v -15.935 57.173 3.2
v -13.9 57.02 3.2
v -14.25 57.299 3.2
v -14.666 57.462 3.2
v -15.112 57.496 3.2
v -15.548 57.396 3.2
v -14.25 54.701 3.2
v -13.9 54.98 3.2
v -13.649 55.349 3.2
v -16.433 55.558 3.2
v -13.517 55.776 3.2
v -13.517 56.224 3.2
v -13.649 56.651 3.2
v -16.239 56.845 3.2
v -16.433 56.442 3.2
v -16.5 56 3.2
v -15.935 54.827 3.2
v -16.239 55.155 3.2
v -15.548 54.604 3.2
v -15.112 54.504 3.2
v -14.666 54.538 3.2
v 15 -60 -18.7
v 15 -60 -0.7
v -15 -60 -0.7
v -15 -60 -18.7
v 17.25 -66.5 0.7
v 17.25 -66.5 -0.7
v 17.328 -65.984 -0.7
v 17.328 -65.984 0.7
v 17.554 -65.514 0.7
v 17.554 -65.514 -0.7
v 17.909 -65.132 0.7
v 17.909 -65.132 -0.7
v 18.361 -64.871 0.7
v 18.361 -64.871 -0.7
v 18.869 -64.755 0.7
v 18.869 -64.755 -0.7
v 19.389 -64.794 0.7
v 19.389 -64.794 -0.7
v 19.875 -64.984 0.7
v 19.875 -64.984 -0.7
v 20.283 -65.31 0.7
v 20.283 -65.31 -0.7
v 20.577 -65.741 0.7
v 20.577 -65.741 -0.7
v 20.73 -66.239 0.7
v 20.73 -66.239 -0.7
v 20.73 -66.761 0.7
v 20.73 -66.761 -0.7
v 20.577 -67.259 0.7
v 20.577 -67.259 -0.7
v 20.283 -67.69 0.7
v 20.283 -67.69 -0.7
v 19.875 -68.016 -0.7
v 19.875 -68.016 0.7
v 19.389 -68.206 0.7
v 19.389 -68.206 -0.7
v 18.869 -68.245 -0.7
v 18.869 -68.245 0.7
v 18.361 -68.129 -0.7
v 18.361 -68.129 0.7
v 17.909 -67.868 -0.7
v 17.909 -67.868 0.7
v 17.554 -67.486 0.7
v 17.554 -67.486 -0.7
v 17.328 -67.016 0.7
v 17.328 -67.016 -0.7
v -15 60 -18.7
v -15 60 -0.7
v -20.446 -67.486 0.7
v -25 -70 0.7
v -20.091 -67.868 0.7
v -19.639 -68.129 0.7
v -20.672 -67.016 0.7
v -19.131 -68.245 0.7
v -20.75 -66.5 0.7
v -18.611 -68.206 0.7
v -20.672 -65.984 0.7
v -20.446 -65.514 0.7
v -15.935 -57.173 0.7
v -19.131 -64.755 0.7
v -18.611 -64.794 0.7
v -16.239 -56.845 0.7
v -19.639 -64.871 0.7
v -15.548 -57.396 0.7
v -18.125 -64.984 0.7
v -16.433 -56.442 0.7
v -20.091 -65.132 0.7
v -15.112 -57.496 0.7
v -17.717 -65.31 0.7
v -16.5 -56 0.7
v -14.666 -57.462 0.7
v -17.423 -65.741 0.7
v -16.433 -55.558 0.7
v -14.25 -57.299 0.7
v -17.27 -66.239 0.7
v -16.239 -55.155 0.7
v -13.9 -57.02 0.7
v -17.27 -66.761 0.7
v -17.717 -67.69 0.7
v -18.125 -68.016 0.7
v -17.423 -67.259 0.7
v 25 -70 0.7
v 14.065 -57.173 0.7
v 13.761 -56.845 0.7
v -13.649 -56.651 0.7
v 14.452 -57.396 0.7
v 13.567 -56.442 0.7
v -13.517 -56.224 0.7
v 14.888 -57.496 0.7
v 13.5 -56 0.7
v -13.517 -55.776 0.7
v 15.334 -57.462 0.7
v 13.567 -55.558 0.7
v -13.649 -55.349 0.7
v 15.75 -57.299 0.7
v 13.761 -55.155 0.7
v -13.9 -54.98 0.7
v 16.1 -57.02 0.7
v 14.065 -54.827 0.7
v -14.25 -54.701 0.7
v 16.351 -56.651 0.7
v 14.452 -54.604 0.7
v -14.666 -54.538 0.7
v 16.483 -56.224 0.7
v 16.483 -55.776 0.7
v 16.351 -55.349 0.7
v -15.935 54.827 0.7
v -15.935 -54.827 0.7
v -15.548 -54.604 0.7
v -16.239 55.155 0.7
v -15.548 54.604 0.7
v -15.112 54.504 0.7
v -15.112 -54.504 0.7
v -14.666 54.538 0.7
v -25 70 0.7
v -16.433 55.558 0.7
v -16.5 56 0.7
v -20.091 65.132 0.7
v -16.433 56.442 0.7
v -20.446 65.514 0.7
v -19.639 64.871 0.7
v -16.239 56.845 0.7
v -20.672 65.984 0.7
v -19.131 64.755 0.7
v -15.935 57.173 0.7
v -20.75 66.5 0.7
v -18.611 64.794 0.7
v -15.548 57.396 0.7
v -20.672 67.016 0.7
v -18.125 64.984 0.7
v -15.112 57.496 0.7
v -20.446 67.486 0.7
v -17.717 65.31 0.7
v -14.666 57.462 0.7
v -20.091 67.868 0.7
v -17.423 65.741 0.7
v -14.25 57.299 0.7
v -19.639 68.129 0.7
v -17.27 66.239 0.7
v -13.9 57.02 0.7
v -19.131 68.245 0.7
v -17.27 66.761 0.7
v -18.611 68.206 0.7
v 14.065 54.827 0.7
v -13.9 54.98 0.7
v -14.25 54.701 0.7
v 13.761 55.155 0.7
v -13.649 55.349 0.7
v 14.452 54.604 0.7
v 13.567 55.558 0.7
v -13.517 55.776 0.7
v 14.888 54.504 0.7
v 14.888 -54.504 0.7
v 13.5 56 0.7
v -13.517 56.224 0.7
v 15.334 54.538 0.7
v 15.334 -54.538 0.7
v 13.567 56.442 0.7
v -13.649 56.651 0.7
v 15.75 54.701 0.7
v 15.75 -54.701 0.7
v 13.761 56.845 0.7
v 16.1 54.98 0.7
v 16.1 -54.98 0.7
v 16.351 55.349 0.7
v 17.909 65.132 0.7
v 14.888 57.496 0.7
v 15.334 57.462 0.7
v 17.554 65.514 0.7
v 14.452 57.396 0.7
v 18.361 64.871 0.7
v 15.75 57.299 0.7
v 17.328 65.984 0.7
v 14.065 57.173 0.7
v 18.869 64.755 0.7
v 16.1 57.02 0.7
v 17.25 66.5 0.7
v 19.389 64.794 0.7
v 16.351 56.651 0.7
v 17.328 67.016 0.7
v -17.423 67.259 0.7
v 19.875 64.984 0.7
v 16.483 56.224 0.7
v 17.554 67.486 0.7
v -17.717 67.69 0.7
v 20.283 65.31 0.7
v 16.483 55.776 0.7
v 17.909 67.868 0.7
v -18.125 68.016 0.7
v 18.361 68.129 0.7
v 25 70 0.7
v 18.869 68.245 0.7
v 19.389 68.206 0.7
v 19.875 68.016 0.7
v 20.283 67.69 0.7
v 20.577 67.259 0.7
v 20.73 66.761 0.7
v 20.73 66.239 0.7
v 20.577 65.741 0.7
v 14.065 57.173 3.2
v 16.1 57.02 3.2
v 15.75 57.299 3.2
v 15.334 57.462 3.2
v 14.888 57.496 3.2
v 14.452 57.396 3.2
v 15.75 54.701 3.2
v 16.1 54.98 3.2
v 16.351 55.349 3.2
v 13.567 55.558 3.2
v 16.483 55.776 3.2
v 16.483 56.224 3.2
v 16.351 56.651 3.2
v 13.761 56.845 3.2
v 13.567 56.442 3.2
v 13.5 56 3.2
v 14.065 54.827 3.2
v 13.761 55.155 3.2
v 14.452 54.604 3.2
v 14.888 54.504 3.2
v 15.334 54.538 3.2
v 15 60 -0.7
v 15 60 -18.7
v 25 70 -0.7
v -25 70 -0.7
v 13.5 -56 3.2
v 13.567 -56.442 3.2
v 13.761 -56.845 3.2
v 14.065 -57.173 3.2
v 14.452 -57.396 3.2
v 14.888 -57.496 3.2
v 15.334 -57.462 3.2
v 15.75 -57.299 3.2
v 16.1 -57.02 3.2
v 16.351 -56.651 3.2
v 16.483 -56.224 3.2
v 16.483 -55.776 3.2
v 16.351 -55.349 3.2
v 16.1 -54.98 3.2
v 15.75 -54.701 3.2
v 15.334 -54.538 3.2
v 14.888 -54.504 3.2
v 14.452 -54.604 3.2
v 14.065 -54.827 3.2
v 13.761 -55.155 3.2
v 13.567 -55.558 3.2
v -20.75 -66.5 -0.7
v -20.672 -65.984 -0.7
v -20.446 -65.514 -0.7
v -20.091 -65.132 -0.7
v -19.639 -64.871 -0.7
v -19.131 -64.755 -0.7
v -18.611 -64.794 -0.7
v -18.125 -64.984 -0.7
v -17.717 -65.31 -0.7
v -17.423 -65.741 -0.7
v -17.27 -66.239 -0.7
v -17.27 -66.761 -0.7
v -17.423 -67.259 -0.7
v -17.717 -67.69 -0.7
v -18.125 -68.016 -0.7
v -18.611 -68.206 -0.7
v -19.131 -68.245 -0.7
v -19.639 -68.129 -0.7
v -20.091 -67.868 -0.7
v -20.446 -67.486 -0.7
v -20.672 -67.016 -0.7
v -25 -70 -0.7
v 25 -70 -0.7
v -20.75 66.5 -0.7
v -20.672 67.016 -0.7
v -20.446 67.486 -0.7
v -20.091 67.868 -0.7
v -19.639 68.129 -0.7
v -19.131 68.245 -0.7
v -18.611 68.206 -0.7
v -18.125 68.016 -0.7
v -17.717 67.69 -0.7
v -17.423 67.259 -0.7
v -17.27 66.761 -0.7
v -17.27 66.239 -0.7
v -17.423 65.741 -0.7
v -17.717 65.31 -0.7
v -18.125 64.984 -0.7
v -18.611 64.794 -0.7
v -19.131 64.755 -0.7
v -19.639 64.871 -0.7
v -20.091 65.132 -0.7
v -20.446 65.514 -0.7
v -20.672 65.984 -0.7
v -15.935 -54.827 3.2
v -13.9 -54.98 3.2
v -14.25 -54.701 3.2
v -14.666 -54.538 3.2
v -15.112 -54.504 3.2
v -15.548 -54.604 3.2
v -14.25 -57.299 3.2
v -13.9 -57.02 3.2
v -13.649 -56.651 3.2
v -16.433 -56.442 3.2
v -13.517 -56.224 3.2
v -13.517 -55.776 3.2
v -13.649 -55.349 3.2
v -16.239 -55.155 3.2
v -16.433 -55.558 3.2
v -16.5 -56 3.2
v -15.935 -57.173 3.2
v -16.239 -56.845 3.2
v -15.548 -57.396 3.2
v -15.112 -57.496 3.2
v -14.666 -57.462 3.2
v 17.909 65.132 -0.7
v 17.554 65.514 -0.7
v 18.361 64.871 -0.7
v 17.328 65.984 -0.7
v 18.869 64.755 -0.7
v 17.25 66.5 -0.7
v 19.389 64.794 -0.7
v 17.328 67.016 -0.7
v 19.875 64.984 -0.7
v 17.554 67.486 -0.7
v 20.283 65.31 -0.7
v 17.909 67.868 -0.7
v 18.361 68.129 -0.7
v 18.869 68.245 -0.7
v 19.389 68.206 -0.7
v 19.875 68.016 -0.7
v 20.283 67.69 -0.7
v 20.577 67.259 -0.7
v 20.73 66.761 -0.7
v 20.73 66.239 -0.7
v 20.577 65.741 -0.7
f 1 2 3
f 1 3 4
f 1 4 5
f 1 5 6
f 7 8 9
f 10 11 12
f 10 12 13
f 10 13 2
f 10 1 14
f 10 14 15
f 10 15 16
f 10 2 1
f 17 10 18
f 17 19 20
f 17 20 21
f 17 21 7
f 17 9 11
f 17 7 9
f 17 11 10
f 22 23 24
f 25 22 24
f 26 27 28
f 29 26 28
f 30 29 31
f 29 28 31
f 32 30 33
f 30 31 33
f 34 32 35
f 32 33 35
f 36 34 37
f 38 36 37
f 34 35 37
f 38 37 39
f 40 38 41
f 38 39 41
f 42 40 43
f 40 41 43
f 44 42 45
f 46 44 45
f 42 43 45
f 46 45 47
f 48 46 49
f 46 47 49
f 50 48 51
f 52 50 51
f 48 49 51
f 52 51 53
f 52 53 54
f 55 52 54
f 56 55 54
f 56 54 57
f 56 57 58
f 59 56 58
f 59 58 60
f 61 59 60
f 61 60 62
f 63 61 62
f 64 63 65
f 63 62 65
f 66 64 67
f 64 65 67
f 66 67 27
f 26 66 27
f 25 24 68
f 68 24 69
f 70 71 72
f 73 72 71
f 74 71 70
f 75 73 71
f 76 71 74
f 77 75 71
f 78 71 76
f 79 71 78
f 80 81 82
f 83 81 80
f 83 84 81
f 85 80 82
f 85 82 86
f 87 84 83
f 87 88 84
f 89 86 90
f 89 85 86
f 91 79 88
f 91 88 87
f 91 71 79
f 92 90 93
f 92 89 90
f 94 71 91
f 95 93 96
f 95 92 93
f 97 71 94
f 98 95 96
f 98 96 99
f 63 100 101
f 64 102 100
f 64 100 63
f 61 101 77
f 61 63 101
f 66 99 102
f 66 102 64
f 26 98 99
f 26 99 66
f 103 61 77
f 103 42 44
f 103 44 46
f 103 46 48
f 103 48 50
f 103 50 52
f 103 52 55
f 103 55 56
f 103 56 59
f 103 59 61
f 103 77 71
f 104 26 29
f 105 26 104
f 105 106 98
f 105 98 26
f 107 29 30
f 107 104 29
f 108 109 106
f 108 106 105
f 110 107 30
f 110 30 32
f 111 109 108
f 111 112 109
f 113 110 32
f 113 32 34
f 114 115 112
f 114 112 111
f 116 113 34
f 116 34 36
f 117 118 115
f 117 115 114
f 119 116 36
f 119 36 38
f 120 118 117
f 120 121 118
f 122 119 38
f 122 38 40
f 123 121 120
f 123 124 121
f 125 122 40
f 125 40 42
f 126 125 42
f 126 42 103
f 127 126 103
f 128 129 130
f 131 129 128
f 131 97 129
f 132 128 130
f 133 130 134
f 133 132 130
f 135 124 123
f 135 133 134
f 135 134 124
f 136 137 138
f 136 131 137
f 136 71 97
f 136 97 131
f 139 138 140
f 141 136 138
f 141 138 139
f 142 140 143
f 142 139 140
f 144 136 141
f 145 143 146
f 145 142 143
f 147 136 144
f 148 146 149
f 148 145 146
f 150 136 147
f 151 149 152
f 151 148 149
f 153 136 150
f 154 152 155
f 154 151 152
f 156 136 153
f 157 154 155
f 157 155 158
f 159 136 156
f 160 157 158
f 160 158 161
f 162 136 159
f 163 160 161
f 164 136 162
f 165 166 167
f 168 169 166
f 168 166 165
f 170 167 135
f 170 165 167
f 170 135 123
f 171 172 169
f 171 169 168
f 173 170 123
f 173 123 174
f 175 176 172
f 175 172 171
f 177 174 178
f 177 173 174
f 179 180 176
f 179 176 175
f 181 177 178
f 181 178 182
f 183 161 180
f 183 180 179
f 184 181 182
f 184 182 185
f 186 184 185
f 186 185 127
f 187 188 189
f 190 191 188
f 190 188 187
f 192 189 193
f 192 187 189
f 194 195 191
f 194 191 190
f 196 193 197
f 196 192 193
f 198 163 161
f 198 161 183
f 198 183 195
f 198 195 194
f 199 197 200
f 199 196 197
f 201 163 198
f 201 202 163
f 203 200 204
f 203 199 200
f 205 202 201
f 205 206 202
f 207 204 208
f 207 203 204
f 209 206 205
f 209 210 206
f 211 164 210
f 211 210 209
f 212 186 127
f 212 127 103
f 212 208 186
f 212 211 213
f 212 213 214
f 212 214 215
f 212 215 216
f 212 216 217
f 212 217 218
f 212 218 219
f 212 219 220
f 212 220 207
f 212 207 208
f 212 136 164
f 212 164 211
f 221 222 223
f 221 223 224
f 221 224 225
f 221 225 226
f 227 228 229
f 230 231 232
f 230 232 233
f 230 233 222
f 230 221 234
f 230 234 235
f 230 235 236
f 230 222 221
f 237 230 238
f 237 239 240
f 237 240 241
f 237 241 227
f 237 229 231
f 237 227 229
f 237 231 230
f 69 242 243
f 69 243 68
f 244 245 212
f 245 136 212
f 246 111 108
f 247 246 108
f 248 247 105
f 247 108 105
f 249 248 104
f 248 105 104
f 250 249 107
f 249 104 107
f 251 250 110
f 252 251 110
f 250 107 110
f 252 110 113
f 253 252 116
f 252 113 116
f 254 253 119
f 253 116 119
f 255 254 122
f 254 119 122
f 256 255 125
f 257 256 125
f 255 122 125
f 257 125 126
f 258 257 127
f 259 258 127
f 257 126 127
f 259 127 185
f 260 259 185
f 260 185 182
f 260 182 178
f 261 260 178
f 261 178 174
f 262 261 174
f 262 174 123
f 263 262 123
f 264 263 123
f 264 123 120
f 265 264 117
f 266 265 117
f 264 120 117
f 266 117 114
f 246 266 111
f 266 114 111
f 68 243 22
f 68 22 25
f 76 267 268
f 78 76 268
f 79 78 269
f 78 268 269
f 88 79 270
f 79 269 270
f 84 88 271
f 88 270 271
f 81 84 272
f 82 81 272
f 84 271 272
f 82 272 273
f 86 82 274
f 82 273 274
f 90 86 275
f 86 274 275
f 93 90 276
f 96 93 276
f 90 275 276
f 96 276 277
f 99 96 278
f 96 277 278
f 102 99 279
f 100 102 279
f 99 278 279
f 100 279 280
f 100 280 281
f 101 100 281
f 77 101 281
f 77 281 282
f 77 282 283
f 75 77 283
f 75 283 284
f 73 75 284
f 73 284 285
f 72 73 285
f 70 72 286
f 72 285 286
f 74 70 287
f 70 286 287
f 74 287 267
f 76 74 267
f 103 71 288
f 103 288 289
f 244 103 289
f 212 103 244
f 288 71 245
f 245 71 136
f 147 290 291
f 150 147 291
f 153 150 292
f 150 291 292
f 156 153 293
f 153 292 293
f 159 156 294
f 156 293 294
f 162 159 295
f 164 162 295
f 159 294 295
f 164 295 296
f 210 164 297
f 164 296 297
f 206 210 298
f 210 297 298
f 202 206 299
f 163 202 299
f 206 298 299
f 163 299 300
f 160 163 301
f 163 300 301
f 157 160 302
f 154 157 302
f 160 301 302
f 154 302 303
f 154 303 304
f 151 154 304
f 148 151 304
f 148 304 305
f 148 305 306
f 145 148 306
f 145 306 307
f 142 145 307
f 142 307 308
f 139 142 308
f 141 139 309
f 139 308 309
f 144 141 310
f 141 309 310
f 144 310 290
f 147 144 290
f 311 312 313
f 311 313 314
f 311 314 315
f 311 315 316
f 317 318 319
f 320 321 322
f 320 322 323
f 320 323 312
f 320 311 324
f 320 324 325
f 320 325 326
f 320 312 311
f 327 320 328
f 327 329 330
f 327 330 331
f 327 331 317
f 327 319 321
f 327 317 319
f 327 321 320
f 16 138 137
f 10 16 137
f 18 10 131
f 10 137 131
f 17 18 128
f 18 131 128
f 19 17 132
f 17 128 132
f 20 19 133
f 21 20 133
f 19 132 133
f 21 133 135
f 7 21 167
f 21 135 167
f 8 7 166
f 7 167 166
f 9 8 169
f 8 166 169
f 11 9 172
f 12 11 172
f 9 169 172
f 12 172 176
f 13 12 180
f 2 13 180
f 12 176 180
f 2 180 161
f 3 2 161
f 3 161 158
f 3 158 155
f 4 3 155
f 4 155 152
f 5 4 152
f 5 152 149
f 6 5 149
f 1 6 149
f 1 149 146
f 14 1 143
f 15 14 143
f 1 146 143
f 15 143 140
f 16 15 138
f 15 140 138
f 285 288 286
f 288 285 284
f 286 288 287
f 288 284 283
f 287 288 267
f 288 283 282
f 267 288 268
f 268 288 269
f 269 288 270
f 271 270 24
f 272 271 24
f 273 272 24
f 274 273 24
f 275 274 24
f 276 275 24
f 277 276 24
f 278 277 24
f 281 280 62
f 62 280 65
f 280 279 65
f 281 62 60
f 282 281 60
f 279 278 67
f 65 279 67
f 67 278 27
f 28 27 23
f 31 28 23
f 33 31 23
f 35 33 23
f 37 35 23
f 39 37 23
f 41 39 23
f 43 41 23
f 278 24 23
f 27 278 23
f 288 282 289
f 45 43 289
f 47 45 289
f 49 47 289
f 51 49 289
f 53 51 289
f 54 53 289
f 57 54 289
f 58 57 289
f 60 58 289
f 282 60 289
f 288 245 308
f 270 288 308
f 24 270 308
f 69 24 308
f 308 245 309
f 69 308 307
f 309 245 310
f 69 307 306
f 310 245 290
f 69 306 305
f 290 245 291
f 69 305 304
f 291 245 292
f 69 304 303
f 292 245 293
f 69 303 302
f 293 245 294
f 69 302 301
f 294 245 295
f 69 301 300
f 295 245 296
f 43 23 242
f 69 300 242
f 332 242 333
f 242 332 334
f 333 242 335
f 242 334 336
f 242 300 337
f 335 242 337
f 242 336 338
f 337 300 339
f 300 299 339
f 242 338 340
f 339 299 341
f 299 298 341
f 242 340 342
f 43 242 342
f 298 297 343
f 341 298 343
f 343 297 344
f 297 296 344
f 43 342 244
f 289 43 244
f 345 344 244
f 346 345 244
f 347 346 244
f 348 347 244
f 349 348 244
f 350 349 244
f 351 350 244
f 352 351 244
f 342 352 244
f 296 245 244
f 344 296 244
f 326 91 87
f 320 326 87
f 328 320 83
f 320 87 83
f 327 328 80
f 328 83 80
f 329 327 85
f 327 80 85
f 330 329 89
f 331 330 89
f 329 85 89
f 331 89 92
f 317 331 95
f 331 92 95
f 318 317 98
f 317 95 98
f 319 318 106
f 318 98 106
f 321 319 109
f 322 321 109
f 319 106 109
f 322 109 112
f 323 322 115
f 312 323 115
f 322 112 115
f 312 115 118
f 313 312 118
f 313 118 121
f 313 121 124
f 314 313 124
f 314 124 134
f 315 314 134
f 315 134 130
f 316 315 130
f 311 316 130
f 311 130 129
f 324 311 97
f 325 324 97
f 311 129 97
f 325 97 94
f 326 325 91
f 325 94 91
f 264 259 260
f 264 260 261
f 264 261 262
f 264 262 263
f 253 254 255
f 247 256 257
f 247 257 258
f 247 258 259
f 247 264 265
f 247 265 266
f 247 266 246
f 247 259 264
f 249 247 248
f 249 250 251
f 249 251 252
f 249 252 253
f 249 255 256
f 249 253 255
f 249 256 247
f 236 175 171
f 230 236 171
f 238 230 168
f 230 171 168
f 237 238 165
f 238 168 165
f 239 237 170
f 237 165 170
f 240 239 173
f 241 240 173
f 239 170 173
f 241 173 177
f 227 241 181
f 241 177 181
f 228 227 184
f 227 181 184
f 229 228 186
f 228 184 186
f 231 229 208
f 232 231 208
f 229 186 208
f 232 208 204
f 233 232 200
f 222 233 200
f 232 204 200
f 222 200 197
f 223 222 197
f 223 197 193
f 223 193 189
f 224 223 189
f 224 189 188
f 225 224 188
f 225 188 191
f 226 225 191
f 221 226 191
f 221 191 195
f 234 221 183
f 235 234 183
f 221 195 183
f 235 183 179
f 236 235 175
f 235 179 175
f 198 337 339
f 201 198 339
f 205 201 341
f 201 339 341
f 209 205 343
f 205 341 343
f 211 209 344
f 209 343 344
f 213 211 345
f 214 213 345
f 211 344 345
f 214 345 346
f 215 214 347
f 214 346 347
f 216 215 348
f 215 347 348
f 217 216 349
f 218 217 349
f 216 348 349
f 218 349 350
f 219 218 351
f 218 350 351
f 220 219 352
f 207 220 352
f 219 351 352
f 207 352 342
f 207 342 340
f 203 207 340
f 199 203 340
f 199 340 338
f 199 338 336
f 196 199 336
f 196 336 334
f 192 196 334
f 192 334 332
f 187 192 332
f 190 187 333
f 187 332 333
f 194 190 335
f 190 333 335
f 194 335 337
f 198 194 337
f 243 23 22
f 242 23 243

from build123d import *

# Parameters (mm, degrees)
SKETCH1_W           = 50
SKETCH1_H           = 140
BOSS_EXTRUDE1_DEPTH = 0.7
SKETCH3_W           = 30
SKETCH3_H           = 120
BOSS_EXTRUDE2_DEPTH = 18
SKETCH4_R           = 1.75
CUT_EXTRUDE1_DEPTH  = 1.4
SKETCH5_R           = 1.5
BOSS_EXTRUDE3_DEPTH = 2.5


with BuildPart() as part:
    # Sketch1 → Boss-Extrude1 (new, symmetric)
    with BuildSketch(Plane.XY):
        Rectangle(SKETCH1_W, SKETCH1_H)
    extrude(amount=BOSS_EXTRUDE1_DEPTH, both=True)

    # Sketch3 → Boss-Extrude2 (add)
    with BuildSketch(Plane(origin=(0, 0, -0.7), x_dir=(-1, 0, 0), z_dir=(0, 0, -1))):
        Rectangle(SKETCH3_W, SKETCH3_H)
    extrude(amount=BOSS_EXTRUDE2_DEPTH)

    # Sketch4 → Cut-Extrude1 (cut)
    with BuildSketch(Plane(origin=(0, 0, -0.7), x_dir=(-1, 0, 0), z_dir=(0, 0, -1))):
        with Locations((-19, 66.5)):
            Circle(SKETCH4_R)
        with Locations((19, 66.5)):
            Circle(SKETCH4_R)
        with Locations((-19, -66.5)):
            Circle(SKETCH4_R)
        with Locations((19, -66.5)):
            Circle(SKETCH4_R)
    extrude(amount=-CUT_EXTRUDE1_DEPTH, mode=Mode.SUBTRACT)

    # Sketch5 → Boss-Extrude3 (add)
    with BuildSketch(Plane.XY.offset(0.7)):
        with Locations(Location((15, 56, 0), (0, 0, 180))):
            Circle(SKETCH5_R)
        with Locations(Location((-15, 56, 0), (0, 0, 180))):
            Circle(SKETCH5_R)
        with Locations(Location((-15, -56, 0), (0, 0, 180))):
            Circle(SKETCH5_R)
        with Locations(Location((15, -56, 0), (0, 0, 180))):
            Circle(SKETCH5_R)
    extrude(amount=BOSS_EXTRUDE3_DEPTH)


solid = part.part
